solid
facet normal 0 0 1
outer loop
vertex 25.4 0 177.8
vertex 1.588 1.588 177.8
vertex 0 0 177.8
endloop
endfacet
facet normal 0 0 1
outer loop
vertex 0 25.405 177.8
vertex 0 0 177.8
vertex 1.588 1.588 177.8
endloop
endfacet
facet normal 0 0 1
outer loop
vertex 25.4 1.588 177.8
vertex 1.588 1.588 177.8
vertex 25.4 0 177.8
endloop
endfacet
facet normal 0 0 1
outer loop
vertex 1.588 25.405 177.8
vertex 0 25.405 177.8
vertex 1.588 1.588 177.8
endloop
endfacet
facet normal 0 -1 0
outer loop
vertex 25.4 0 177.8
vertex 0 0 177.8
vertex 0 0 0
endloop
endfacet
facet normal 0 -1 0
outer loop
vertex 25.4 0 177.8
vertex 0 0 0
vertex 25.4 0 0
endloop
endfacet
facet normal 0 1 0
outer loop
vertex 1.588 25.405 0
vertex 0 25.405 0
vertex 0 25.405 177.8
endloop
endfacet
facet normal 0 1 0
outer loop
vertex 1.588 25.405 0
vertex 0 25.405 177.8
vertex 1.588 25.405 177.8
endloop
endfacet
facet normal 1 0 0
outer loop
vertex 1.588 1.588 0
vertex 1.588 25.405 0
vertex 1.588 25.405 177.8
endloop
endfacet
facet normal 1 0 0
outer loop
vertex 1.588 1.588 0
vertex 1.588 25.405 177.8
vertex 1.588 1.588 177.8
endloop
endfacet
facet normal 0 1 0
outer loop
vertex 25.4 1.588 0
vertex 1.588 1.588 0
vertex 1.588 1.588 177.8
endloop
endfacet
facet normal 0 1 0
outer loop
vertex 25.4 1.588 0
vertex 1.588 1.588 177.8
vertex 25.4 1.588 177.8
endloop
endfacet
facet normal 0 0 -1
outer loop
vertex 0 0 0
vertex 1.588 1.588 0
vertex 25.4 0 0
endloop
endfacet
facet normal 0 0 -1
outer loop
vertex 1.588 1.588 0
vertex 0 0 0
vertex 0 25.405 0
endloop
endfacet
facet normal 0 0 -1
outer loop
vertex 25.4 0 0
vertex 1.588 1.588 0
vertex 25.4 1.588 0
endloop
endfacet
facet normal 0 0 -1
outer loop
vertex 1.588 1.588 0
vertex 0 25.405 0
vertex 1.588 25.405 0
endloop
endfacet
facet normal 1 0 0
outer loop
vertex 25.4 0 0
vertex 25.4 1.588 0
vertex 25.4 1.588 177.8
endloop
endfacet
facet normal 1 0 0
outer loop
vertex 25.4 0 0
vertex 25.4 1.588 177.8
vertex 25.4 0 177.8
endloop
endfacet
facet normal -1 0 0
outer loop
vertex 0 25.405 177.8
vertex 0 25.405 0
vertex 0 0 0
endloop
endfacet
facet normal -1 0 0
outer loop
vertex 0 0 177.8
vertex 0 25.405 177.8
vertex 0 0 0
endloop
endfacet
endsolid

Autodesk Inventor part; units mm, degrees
ref_plane "YZ Plane" through (0, 0, 0) normal (1, 0, 0) x (0, 1, 0)
ref_plane "XZ Plane" through (0, 0, 0) normal (0, 1, 0) x (-1, 0, 0)
ref_plane "XY Plane" through (0, 0, 0) normal (0, 0, 1) x (1, 0, 0)
sketch "Sketch1" plane through (0, 0, 0) normal (0, 0, 1) x (1, 0, 0)
  line L0 (0, 0) -> (25.4, 0)
  line L1 (0, 25.4053) -> (0, 0)
  line L2 (1.5875, 22.2862) -> (1.5875, 23.8178) construction
  line L3 (1.5875, 25.4053) -> (1.5875, 1.5875)
  line L4 (1.5875, 1.5875) -> (25.4, 1.5875)
  line L5 (0, 25.4053) -> (1.5875, 25.4053)
  line L6 (25.4, 1.5875) -> (25.4, 0)
extrude "Extrusion2" add sketch "Sketch1" along normal blind 177.8
properties part number "Hook7in L Channel"
